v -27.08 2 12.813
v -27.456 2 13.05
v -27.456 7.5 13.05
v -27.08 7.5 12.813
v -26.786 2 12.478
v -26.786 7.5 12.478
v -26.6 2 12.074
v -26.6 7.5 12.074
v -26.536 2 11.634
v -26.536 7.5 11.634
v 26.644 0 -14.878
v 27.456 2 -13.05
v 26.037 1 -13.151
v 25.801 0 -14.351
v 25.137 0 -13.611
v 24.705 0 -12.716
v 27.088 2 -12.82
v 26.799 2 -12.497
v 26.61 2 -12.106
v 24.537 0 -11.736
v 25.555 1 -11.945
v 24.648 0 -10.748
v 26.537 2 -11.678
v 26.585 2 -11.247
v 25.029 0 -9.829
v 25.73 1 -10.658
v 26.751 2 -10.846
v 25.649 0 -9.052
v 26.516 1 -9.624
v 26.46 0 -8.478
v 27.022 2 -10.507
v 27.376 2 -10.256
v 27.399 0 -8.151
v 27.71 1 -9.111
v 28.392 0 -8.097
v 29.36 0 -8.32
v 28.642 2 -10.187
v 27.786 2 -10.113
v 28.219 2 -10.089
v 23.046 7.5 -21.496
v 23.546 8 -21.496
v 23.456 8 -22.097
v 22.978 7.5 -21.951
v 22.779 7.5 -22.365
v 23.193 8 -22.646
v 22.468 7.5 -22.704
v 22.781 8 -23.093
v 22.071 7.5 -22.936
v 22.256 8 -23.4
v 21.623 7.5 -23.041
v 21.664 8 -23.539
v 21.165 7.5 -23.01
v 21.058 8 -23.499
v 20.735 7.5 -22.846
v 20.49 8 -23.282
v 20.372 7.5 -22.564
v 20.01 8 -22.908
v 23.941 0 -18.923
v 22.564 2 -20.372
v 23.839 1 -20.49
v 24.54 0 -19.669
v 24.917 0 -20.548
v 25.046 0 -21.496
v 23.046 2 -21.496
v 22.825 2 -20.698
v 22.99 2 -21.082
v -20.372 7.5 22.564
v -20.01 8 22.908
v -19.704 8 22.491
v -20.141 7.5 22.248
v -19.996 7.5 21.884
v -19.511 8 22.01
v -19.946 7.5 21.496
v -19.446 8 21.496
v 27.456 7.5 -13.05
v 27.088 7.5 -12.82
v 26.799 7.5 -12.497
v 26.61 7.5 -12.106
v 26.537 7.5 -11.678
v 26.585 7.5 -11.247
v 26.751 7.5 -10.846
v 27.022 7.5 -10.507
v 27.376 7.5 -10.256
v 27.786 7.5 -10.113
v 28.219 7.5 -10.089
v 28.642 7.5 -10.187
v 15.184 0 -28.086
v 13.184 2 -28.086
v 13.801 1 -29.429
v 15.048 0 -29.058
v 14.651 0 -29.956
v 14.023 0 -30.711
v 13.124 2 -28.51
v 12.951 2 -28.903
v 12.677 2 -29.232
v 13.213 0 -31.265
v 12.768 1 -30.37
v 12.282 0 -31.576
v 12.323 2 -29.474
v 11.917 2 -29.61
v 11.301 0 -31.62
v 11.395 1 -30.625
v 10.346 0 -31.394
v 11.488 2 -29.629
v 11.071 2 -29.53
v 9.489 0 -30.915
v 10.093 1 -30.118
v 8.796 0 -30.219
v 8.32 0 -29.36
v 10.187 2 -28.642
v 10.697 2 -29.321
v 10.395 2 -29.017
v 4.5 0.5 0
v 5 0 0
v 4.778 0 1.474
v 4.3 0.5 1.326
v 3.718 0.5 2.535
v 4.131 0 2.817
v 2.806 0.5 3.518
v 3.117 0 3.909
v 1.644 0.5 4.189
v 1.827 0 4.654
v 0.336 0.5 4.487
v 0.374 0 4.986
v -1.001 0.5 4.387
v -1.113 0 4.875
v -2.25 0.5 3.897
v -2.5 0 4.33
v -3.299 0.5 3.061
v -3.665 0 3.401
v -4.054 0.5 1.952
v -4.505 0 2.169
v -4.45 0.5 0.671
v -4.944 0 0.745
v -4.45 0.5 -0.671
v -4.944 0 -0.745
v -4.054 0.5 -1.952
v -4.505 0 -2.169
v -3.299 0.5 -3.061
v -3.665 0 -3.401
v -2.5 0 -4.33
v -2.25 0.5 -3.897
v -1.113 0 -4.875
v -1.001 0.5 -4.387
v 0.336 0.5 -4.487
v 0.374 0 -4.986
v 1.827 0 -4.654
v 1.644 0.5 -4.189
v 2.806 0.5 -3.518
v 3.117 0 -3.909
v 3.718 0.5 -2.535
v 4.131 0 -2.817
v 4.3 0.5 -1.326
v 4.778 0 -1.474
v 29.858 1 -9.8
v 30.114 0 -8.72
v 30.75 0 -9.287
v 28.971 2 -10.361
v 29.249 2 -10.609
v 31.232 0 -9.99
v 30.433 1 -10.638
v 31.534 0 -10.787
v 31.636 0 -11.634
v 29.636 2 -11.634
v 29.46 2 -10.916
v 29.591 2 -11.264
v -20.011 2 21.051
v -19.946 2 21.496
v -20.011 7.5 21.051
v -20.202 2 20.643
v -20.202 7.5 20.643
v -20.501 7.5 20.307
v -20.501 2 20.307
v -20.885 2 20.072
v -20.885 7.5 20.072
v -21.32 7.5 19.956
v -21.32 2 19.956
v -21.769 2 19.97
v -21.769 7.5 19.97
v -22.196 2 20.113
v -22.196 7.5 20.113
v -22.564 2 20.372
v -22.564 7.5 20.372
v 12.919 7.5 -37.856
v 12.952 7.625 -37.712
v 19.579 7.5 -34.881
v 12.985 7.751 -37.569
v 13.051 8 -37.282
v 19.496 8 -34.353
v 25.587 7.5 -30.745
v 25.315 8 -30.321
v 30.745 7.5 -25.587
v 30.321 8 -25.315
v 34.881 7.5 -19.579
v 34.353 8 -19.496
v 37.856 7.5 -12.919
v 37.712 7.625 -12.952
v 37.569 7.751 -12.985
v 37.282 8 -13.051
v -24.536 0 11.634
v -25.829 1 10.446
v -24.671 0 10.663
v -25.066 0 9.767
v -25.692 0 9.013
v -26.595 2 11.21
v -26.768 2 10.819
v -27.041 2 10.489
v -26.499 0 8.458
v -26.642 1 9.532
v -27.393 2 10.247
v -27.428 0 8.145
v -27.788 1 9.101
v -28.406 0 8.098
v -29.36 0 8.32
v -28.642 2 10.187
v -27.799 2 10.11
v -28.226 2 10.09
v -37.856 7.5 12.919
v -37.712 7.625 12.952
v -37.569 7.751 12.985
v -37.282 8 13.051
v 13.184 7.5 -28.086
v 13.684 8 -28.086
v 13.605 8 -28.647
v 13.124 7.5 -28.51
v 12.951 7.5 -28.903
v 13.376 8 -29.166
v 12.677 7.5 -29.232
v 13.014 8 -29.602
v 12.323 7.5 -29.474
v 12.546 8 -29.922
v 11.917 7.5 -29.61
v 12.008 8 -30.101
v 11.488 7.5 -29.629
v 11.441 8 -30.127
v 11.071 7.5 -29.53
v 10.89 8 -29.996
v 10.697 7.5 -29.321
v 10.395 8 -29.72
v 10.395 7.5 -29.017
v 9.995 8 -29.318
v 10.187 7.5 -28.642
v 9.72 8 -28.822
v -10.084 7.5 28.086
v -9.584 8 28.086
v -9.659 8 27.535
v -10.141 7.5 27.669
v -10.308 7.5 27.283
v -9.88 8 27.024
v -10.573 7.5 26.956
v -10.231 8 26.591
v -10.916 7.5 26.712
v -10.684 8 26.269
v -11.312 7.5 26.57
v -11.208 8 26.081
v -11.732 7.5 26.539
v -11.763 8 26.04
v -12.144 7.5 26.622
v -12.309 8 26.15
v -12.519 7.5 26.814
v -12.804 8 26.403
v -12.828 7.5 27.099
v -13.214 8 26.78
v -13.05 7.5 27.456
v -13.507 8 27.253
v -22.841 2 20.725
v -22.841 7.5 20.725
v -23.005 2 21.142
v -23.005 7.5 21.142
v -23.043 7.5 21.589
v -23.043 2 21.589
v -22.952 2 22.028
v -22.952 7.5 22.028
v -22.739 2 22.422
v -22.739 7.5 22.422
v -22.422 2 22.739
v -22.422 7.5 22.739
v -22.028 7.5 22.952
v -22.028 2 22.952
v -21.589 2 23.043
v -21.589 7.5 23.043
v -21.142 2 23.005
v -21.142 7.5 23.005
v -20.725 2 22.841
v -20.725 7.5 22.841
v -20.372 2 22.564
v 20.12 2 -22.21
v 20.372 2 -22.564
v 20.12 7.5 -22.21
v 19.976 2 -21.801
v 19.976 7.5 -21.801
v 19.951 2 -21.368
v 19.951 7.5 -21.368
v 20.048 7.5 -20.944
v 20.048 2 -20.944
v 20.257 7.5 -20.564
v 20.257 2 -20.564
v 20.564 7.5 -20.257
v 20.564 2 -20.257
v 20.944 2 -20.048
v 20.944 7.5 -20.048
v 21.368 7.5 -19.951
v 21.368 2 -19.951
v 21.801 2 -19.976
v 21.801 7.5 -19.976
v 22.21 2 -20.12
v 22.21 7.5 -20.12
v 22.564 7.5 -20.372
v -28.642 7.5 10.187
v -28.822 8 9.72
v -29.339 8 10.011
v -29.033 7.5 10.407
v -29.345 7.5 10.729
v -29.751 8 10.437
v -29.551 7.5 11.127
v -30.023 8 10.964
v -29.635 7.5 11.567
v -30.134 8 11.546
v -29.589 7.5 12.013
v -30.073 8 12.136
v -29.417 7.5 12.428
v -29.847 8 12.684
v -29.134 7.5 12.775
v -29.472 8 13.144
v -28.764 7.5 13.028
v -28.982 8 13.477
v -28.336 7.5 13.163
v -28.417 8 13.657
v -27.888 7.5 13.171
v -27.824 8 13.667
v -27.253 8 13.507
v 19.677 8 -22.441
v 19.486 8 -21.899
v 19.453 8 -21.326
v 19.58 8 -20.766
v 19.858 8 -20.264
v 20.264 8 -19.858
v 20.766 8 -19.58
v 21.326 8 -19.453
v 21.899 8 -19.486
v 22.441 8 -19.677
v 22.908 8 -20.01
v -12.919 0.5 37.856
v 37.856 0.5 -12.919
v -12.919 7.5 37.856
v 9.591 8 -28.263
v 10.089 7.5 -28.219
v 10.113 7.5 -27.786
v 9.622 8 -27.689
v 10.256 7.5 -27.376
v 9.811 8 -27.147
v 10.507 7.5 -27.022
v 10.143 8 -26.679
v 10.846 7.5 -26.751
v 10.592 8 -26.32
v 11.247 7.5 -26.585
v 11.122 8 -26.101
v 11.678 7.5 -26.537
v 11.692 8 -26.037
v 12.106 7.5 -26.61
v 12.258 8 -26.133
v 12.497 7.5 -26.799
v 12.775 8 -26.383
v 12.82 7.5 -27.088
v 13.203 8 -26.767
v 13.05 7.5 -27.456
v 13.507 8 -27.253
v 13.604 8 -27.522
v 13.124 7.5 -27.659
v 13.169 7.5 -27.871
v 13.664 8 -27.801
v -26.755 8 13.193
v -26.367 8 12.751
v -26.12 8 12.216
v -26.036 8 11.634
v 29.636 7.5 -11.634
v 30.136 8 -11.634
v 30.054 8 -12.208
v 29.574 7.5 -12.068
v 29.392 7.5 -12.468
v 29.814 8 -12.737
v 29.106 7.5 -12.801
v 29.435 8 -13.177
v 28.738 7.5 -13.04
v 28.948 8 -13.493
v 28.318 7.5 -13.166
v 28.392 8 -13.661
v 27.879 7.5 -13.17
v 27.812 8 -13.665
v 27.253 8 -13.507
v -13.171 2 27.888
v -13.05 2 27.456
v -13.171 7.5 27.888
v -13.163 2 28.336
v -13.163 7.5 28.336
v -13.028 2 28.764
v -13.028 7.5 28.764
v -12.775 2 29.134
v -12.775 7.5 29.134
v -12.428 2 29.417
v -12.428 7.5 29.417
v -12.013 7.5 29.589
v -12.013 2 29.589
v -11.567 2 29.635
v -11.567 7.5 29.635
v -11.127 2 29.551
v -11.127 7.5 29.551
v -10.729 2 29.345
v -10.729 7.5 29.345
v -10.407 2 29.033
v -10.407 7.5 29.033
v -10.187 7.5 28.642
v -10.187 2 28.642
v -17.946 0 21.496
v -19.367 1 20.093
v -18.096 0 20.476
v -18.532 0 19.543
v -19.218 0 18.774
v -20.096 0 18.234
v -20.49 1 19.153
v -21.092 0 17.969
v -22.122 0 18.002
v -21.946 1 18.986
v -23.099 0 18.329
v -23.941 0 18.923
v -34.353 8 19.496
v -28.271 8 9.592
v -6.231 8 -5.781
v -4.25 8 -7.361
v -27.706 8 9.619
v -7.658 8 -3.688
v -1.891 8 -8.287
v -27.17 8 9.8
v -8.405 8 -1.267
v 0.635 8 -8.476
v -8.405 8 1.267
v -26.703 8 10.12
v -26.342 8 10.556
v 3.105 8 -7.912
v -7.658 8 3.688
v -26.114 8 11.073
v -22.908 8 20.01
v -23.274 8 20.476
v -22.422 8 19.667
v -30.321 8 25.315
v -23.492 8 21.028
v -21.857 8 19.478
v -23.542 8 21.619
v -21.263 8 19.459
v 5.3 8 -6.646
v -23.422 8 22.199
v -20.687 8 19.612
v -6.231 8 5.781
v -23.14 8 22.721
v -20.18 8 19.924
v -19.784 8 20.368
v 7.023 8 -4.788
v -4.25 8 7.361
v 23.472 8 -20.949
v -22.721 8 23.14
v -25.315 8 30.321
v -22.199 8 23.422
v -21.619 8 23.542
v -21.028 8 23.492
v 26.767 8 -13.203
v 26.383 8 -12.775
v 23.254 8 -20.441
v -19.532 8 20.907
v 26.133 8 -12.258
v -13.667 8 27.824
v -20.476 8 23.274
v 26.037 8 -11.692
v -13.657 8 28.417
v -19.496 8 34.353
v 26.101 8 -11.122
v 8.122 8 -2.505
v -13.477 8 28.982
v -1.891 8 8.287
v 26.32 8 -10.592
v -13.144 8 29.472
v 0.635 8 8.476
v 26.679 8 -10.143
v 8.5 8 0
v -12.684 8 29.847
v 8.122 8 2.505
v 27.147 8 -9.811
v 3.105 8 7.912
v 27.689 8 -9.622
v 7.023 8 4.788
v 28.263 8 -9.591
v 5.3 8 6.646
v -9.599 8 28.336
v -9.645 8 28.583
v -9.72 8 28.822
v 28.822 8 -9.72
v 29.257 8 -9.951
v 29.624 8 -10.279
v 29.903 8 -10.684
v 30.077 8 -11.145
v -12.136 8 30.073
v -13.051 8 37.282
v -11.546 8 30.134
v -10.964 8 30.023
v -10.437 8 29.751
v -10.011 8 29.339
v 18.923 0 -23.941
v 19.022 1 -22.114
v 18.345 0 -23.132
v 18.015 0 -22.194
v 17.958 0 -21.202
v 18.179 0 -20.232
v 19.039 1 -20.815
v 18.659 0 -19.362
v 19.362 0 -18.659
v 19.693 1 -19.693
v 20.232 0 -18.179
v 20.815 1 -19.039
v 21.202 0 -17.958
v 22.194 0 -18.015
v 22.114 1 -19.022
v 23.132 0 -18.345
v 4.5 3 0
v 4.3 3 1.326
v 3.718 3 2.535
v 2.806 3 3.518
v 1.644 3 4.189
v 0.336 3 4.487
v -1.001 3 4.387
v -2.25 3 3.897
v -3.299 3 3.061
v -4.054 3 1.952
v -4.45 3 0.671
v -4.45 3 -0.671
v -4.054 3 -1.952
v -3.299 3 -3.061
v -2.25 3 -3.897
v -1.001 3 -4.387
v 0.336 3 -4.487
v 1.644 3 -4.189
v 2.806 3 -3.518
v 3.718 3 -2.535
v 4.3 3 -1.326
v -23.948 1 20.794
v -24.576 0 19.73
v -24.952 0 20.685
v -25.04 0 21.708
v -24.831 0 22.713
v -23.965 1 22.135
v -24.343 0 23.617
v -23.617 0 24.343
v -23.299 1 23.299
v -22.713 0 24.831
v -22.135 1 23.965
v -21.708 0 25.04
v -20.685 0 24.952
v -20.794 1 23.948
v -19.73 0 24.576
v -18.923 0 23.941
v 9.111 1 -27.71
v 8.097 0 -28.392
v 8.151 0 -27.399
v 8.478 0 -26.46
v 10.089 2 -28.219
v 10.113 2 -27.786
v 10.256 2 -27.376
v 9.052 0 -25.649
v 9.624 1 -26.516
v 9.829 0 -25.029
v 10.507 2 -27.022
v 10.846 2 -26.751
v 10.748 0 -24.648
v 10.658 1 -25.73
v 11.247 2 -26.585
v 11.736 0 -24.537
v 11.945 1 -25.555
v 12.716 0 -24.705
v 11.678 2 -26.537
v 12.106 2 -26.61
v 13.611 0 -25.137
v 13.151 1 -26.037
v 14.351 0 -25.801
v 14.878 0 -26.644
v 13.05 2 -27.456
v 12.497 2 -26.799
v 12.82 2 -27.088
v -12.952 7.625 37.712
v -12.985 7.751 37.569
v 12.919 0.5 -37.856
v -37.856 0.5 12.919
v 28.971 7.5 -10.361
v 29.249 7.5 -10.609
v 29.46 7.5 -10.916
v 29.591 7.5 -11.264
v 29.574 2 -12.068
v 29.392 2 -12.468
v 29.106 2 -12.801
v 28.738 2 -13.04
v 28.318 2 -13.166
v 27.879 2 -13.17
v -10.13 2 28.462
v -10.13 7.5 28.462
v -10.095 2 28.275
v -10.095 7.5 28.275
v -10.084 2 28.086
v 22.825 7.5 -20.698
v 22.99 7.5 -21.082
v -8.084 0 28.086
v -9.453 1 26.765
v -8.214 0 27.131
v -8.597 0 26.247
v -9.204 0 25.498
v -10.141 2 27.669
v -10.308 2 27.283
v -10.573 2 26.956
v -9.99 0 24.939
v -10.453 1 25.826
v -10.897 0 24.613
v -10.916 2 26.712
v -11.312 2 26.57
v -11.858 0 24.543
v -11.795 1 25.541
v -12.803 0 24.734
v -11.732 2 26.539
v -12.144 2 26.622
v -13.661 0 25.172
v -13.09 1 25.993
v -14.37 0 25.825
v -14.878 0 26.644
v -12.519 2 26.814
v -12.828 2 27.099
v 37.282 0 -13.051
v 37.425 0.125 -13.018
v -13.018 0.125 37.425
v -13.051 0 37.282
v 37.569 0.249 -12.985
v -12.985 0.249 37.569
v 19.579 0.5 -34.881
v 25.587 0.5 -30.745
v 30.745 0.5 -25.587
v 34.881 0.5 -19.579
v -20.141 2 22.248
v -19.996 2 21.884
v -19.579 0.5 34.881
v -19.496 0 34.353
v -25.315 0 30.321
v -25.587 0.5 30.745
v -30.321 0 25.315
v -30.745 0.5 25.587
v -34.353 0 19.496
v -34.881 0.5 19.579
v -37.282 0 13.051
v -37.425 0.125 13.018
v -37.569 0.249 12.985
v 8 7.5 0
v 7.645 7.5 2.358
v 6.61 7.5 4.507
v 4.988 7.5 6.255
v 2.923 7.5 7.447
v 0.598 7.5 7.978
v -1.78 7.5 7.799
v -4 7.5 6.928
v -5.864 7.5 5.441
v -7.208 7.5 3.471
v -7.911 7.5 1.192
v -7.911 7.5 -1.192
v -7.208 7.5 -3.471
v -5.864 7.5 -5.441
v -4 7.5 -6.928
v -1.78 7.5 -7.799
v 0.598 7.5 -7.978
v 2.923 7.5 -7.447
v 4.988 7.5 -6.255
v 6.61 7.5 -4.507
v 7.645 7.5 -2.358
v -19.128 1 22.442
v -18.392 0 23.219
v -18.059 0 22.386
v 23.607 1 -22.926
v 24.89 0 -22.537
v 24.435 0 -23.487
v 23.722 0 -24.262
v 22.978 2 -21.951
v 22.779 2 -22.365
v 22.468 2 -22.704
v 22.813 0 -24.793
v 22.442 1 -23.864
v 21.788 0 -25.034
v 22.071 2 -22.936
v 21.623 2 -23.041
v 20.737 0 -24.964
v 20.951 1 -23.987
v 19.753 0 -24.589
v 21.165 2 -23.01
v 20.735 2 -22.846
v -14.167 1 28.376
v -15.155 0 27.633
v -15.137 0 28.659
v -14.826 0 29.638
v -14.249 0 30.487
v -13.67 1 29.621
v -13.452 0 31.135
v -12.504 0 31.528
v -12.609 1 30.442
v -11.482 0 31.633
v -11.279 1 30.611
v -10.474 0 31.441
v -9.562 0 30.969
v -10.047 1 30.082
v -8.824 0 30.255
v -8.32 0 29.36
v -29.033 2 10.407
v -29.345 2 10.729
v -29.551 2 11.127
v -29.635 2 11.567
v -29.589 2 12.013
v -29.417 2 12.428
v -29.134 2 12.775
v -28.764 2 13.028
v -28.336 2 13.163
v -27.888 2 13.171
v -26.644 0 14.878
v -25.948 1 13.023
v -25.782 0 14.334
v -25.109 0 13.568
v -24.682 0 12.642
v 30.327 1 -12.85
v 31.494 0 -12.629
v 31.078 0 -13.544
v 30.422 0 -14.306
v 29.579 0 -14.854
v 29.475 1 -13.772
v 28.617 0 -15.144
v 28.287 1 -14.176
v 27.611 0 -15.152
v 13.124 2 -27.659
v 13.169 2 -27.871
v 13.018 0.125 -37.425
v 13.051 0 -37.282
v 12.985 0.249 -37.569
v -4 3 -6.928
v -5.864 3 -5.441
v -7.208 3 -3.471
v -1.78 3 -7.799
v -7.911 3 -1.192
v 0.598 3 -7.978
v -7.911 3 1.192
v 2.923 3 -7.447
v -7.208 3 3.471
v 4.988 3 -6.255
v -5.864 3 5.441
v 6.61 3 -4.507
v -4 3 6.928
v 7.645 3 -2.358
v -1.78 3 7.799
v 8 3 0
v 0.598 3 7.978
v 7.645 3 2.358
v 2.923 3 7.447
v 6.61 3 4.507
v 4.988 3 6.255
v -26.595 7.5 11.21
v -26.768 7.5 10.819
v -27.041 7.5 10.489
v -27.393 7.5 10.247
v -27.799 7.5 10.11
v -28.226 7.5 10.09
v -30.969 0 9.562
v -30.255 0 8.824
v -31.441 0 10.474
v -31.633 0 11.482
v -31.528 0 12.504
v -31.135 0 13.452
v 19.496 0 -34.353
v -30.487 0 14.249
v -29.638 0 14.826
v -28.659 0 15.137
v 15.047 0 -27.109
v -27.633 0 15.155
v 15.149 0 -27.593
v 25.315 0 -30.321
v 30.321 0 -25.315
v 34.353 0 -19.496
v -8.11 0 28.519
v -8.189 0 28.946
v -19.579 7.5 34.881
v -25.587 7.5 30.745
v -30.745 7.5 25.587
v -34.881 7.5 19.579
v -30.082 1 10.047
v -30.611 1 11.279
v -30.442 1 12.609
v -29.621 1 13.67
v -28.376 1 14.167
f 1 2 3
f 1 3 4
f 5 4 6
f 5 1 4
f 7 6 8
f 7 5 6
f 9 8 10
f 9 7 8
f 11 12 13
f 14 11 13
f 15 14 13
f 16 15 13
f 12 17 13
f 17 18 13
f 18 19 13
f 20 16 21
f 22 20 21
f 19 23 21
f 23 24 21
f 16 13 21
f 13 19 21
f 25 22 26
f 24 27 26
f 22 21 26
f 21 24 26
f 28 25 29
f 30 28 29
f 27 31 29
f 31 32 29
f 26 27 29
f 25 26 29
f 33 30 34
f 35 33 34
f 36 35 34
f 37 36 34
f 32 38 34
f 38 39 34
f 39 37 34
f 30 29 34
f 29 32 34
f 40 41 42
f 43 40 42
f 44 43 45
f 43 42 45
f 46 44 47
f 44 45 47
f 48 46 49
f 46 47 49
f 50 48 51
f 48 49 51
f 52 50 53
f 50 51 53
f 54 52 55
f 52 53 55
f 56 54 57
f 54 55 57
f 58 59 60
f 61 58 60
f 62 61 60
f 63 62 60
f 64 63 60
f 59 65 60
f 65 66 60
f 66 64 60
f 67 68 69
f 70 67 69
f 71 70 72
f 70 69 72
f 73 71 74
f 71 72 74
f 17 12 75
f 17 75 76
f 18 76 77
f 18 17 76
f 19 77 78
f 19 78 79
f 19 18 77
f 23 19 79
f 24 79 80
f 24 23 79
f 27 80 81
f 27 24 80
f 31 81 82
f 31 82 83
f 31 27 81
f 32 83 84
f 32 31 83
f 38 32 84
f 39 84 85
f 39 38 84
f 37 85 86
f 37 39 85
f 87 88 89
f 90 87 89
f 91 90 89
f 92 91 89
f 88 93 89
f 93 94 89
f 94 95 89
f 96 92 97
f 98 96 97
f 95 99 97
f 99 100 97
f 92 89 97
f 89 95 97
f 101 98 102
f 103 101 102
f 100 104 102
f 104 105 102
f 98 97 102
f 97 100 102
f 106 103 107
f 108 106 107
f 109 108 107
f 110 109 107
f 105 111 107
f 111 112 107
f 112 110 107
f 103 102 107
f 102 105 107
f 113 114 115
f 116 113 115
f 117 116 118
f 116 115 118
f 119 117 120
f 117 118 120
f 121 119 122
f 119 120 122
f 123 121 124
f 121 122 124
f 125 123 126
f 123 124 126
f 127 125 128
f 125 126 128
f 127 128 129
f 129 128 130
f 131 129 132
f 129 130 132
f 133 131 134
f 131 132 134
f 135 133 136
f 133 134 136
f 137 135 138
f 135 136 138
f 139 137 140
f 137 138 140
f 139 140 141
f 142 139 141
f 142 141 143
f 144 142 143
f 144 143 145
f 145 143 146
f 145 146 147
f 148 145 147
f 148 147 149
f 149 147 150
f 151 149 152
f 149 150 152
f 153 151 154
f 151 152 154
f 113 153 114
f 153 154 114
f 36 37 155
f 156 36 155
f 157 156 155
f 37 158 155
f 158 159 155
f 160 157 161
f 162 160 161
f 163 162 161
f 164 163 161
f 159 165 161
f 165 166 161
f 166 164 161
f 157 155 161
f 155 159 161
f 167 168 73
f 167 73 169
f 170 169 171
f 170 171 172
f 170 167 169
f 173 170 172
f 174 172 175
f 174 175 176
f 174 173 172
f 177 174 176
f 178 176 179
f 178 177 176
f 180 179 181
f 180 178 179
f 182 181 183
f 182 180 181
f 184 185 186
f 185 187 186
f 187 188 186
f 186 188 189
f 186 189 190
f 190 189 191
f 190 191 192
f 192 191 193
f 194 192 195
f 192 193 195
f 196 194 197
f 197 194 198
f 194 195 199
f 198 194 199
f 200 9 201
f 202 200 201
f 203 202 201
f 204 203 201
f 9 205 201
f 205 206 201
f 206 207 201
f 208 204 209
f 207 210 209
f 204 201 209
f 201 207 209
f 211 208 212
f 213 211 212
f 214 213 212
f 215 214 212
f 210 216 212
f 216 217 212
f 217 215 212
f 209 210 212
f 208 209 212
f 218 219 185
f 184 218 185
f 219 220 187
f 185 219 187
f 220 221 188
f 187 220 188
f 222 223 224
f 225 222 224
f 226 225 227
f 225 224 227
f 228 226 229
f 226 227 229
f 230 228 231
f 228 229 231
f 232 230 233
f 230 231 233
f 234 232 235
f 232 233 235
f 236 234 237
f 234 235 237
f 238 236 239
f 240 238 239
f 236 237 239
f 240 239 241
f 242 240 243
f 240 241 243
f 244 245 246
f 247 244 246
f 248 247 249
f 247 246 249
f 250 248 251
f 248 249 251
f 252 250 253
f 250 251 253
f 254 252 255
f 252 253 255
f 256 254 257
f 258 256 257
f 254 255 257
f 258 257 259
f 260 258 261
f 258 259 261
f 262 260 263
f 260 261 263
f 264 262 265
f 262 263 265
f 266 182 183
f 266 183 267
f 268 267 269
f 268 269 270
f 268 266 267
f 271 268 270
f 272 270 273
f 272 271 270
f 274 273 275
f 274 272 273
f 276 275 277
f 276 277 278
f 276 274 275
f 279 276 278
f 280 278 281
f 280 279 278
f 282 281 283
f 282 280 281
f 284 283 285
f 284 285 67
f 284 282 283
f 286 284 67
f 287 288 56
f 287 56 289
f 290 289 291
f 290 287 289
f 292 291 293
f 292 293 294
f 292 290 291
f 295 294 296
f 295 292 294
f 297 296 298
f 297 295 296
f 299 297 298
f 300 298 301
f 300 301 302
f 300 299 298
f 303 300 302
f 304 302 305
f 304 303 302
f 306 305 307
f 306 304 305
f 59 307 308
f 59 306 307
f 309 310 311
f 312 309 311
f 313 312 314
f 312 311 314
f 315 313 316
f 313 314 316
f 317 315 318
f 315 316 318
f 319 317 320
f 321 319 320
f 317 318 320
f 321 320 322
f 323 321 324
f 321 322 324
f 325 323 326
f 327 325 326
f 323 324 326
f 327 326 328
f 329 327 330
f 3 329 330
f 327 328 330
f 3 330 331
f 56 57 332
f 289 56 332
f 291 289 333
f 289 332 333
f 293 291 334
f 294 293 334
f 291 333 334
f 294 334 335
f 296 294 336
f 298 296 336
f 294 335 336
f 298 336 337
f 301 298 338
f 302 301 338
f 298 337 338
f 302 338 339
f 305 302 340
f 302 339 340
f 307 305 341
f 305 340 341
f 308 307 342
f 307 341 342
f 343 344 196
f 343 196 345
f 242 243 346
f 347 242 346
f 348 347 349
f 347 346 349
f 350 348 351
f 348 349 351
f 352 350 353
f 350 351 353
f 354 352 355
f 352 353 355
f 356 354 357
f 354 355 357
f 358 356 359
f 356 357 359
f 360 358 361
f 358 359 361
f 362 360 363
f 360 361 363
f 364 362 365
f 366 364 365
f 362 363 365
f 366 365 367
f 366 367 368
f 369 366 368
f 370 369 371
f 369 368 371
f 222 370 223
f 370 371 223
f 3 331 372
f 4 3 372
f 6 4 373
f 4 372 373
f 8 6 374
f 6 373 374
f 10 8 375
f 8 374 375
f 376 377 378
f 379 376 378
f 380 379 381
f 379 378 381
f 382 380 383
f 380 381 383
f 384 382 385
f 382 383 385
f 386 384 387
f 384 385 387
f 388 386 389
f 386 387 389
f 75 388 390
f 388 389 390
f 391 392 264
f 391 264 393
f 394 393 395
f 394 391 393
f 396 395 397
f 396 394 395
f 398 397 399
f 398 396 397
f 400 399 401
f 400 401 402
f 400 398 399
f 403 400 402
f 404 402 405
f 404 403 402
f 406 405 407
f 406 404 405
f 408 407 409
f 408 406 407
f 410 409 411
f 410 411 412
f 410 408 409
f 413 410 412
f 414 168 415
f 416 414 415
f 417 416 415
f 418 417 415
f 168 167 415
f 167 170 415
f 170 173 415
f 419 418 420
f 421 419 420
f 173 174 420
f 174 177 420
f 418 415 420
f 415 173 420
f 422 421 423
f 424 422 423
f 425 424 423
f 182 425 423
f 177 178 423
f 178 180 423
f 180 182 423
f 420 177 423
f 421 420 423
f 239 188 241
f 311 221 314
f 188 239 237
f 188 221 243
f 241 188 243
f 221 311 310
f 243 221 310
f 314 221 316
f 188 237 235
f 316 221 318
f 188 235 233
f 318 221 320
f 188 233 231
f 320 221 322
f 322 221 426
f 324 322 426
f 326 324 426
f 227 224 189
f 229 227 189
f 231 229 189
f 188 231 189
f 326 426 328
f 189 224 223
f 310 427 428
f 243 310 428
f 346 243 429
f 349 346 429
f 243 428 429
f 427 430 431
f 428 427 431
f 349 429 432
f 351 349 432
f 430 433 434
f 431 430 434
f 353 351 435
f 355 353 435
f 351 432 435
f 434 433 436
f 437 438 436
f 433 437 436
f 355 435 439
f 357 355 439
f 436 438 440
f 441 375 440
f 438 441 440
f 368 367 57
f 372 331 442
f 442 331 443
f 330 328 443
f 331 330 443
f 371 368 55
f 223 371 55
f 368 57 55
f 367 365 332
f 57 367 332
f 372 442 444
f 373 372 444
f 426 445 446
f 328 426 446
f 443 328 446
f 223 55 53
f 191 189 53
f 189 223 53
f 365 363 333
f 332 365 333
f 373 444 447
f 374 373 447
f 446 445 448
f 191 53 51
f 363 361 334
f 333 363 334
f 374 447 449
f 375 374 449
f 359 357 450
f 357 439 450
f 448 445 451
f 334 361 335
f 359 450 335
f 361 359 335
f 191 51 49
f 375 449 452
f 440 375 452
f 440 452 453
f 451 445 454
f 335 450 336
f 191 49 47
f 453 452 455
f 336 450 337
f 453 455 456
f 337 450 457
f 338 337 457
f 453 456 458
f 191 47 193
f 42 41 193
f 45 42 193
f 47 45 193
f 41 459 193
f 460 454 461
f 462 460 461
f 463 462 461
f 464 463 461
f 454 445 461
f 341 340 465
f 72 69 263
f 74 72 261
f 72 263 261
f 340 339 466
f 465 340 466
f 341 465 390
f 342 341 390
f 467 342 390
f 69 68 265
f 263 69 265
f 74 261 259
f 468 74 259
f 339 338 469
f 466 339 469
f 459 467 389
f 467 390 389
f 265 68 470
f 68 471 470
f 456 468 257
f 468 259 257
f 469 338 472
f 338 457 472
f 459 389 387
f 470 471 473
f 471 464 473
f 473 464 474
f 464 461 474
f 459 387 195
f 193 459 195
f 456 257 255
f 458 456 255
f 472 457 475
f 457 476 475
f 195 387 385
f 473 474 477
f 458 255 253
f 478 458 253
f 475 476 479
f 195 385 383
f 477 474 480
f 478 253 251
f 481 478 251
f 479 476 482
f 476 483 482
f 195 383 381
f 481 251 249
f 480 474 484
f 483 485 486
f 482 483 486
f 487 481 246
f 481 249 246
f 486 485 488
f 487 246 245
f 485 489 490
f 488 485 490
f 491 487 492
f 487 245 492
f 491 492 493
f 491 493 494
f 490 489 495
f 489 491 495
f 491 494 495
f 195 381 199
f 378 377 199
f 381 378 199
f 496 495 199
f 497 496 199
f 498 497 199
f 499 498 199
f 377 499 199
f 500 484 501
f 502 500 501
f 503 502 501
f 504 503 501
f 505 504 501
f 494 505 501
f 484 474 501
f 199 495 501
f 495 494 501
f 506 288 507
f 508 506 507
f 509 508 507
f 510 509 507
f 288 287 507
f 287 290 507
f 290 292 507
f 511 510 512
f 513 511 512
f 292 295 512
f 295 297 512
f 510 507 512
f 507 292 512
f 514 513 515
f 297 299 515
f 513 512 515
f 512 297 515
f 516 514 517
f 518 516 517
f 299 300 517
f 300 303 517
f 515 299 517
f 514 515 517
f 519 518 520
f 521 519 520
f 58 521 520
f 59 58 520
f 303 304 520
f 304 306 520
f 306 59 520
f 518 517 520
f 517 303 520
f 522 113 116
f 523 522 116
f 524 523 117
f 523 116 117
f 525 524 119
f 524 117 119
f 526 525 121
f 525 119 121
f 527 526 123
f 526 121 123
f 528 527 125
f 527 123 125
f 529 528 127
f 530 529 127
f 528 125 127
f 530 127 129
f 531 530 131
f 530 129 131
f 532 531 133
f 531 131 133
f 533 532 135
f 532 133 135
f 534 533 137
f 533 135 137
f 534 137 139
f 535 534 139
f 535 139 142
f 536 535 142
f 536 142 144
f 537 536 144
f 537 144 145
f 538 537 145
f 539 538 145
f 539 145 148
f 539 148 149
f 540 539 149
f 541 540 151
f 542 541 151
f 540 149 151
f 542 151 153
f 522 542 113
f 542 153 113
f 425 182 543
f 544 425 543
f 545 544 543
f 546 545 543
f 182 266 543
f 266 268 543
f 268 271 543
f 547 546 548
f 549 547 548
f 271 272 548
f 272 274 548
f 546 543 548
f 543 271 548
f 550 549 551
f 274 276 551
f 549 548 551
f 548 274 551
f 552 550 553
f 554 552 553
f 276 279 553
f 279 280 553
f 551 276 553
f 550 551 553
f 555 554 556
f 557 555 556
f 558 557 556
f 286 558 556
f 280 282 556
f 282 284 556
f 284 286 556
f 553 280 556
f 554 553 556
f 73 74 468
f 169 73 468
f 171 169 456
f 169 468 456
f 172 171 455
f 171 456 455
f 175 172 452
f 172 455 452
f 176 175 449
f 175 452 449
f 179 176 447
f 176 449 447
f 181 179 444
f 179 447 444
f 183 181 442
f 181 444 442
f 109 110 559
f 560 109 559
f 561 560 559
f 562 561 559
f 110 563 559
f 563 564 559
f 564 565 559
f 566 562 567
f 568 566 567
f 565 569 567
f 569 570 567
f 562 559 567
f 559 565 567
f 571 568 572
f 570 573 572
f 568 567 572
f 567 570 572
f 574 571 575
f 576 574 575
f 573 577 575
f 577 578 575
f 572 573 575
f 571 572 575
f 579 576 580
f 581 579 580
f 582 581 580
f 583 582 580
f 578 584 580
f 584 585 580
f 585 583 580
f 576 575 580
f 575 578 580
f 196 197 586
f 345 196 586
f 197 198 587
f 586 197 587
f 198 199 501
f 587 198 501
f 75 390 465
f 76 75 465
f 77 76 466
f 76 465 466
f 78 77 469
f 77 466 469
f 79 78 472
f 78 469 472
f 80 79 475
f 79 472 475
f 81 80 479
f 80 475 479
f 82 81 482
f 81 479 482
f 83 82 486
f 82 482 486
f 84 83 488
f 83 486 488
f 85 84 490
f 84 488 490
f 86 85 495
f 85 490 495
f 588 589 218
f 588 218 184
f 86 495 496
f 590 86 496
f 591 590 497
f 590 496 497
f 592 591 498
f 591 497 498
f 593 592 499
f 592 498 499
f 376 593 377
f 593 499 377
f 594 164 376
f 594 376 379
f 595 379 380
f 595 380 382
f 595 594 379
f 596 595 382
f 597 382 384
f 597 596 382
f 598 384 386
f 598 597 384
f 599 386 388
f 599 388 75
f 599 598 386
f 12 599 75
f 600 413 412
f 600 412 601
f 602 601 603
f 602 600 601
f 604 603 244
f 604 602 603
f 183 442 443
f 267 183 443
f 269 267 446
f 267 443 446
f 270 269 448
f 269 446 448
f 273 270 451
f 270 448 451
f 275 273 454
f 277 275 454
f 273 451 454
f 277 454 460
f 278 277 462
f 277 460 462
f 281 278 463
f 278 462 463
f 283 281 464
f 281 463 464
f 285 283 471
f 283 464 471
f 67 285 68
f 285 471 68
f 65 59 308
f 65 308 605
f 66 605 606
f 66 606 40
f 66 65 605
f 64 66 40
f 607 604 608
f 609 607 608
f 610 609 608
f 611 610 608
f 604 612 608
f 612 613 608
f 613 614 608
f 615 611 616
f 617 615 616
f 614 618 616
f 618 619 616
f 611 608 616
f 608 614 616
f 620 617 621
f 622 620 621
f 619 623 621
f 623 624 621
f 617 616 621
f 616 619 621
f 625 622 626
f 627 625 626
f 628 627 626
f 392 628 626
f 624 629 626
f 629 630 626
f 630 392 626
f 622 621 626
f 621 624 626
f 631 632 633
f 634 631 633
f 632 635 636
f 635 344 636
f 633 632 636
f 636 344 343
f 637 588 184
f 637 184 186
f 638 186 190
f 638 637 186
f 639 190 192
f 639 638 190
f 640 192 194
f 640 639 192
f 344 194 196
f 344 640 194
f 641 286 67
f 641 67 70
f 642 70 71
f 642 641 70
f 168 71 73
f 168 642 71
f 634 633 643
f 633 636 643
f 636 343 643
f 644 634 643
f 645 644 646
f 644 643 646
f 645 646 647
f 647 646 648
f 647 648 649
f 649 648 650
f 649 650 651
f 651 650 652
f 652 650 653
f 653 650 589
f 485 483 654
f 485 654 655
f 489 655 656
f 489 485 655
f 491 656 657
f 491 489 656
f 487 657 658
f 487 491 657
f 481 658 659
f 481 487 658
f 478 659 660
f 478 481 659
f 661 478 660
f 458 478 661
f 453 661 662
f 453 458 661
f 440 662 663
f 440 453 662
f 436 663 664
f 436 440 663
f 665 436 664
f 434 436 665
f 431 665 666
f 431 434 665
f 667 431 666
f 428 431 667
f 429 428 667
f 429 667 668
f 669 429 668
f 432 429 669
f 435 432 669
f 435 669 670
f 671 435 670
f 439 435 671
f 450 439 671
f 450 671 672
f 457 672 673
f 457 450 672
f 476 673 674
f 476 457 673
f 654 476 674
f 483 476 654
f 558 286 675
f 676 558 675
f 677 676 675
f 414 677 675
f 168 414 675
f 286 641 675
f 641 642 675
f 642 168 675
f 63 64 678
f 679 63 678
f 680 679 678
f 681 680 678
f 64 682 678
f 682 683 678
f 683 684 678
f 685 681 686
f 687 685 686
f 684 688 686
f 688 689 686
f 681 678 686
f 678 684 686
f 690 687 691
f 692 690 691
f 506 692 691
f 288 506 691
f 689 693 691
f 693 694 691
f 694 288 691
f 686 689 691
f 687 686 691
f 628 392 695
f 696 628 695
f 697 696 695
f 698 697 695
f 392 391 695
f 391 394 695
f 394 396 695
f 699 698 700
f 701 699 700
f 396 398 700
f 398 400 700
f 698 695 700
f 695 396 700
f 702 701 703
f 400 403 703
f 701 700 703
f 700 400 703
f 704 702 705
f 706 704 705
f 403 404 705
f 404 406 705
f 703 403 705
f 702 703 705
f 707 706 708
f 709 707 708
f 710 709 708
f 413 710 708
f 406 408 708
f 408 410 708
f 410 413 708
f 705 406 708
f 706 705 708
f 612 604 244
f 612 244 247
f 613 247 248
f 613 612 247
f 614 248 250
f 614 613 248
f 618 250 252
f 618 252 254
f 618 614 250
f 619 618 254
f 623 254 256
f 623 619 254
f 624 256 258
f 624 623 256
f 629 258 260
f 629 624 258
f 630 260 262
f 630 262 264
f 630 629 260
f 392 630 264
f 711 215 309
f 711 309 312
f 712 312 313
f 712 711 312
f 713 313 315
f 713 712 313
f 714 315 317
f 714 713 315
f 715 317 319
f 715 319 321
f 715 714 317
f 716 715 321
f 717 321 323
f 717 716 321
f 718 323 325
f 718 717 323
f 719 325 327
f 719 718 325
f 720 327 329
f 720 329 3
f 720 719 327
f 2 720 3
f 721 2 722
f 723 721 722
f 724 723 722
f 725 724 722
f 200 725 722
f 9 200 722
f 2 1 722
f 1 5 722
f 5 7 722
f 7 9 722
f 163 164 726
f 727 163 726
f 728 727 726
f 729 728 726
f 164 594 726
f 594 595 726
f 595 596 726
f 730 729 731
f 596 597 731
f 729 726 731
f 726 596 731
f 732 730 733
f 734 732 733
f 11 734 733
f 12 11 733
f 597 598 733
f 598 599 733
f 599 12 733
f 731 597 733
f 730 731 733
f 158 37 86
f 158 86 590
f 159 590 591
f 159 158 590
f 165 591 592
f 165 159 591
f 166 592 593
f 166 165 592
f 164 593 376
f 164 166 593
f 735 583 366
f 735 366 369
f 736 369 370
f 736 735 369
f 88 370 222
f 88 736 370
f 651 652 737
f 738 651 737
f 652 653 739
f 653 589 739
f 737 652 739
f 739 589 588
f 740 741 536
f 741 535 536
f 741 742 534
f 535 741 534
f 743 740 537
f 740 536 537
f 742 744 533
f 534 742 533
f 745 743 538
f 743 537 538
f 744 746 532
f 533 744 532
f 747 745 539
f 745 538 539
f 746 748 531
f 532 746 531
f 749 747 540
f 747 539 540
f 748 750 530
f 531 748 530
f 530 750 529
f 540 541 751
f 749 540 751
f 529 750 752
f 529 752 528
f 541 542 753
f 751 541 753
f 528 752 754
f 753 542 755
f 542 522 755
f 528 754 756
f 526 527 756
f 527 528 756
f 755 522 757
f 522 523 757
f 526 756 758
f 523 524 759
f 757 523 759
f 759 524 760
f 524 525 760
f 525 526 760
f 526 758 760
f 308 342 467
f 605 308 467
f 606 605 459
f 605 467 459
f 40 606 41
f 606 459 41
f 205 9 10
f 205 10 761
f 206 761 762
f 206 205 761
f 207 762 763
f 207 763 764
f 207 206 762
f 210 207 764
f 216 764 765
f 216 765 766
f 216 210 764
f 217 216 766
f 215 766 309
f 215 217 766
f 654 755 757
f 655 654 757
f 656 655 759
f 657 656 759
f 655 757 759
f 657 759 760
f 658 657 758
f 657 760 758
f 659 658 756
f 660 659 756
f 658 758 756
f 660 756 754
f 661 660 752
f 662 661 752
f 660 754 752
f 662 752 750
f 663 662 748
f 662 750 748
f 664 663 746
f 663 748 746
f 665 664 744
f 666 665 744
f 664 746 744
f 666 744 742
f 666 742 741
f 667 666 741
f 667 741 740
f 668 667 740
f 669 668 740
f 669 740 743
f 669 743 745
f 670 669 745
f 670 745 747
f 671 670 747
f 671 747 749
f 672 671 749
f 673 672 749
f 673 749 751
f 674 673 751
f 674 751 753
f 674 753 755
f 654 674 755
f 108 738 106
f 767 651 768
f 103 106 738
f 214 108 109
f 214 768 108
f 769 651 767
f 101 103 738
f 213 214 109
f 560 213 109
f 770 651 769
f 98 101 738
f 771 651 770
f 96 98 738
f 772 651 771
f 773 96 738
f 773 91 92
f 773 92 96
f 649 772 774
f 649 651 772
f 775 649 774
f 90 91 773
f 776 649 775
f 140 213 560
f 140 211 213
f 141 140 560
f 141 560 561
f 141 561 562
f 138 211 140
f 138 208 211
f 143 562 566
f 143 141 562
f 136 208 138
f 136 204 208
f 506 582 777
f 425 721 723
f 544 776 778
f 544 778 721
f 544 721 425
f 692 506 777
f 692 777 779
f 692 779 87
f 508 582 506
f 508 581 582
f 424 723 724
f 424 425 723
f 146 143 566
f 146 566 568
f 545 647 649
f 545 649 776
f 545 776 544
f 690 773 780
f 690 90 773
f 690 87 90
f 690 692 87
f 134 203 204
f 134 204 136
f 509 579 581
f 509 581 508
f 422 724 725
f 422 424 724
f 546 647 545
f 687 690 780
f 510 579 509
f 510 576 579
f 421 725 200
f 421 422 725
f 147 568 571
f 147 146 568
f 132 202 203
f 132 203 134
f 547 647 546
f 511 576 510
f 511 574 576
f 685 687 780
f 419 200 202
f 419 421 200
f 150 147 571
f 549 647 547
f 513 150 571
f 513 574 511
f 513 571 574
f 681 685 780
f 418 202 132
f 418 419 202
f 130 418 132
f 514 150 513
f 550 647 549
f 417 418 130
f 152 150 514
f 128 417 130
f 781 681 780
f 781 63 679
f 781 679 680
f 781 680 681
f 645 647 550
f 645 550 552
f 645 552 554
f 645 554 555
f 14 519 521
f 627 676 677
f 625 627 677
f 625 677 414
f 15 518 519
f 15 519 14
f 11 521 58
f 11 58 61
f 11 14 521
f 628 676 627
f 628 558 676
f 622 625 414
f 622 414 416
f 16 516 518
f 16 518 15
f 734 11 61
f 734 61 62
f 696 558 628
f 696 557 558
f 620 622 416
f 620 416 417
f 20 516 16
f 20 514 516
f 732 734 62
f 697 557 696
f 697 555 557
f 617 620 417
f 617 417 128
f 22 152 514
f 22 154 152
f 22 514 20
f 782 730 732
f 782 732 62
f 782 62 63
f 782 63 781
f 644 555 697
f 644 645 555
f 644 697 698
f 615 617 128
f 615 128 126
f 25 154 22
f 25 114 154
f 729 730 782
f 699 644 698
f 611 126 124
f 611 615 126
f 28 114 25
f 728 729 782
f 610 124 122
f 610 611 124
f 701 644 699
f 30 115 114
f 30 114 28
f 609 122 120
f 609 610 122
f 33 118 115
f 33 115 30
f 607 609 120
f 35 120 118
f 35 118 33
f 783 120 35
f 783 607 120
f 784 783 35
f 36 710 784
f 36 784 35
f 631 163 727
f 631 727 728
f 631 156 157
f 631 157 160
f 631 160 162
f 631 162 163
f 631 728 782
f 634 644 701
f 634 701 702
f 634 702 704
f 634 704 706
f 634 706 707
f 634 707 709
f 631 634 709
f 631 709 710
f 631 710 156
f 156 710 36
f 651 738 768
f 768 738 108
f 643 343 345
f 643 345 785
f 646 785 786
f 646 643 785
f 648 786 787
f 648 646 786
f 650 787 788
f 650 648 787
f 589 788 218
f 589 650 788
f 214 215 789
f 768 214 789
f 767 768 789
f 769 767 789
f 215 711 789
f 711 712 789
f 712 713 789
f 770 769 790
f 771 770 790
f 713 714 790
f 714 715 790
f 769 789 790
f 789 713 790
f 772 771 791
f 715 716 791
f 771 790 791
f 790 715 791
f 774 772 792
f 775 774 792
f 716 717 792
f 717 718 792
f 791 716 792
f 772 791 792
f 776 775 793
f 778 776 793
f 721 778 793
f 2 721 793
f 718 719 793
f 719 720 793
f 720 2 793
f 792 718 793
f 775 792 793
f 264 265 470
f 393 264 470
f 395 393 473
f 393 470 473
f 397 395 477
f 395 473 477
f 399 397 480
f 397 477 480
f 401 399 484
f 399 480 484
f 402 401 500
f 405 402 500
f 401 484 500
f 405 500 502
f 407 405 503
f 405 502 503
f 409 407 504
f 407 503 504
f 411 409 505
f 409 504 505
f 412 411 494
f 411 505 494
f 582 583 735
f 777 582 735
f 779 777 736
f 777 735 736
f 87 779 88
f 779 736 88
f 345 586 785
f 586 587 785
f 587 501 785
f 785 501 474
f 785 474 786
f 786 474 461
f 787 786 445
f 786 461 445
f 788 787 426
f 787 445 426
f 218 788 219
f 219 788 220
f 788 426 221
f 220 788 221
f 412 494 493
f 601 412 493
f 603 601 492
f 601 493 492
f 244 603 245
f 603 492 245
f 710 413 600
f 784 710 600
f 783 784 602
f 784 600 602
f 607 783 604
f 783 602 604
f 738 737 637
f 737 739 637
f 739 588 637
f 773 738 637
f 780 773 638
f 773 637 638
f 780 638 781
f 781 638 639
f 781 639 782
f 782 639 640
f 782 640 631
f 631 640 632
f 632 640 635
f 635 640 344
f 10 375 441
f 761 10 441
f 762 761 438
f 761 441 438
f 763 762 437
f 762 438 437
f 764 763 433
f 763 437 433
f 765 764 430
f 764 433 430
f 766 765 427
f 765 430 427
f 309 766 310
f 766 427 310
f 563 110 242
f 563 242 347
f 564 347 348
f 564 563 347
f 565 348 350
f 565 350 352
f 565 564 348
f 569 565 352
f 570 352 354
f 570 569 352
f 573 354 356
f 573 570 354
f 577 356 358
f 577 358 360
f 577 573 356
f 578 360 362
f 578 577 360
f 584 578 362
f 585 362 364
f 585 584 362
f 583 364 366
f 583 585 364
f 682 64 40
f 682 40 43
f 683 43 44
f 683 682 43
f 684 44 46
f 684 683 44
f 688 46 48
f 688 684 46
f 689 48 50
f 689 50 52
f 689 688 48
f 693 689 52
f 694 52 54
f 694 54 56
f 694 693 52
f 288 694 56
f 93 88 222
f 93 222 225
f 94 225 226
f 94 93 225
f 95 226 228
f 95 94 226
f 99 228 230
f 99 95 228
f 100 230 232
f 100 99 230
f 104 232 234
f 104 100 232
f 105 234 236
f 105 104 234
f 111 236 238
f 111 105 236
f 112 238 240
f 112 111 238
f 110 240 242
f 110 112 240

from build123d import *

# Parameters (mm, degrees)
F0_R     = 8
F1_DEPTH = 8
F0_R_2   = 4.5
F2_DEPTH = 3
F3_SIZE  = 0.5
F4_SIZE  = 2


with BuildPart() as f1:
    # F0 (on Front) → F1 (new body)
    with BuildSketch(Plane.XZ):
        with BuildLine():
            Line((-7.7551369733, 32.692779792), (-12.9187443003, 37.856387119))
            ThreePointArc((-12.9187443003, 37.856387119), (-28.2842712475, 28.2842712475), (-37.856387119, 12.9187443003))
            Line((-37.856387119, 12.9187443003), (-32.692779792, 7.7551369733))
            ThreePointArc((-32.692779792, 7.7551369733), (-23.7587878479, 23.7587878479), (-7.7551369733, 32.692779792))
        make_face()
        with BuildLine():
            Line((-5.0414182424, 29.9790610611), (-7.7551369733, 32.692779792))
            ThreePointArc((-7.7551369733, 32.692779792), (-23.7587878479, 23.7587878479), (-32.692779792, 7.7551369733))
            Line((-32.692779792, 7.7551369733), (-29.9790610611, 5.0414182424))
            ThreePointArc((-29.9790610611, 5.0414182424), (-29.423423687, 7.6434376124), (-28.6423974084, 10.1869068269))
            ThreePointArc((-28.6423974084, 10.1869068269), (-29.5179510637, 12.2267356641), (-27.4564643335, 13.0500025402))
            ThreePointArc((-27.4564643335, 13.0500025402), (-25.276676214, 16.8893350838), (-22.5637642579, 20.3724456684))
            ThreePointArc((-22.5637642579, 20.3724456684), (-22.5920616589, 22.5920616589), (-20.3724456684, 22.5637642579))
            ThreePointArc((-20.3724456684, 22.5637642579), (-16.8893350838, 25.276676214), (-13.0500025402, 27.4564643335))
            ThreePointArc((-13.0500025402, 27.4564643335), (-12.2267356641, 29.5179510637), (-10.1869068269, 28.6423974084))
            ThreePointArc((-10.1869068269, 28.6423974084), (-7.6434376124, 29.423423687), (-5.0414182424, 29.9790610611))
        make_face()
        with BuildLine():
            Line((-0.0622796062, 24.9999224249), (-5.0414182424, 29.9790610611))
            ThreePointArc((-5.0414182424, 29.9790610611), (-7.6434376124, 29.423423687), (-10.1869068269, 28.6423974084))
            ThreePointArc((-10.1869068269, 28.6423974084), (-10.1096278948, 28.3689238734), (-10.0835763439, 28.0859377883))
            ThreePointArc((-10.0835763439, 28.0859377883), (-11.3118315726, 26.5696989212), (-13.0500025402, 27.4564643335))
            ThreePointArc((-13.0500025402, 27.4564643335), (-16.8893350838, 25.276676214), (-20.3724456684, 22.5637642579))
            ThreePointArc((-20.3724456684, 22.5637642579), (-20.0565877875, 22.0709023286), (-19.9460461481, 21.4960461481))
            ThreePointArc((-19.9460461481, 21.4960461481), (-20.8846800835, 20.0717106767), (-22.5637642579, 20.3724456684))
            ThreePointArc((-22.5637642579, 20.3724456684), (-25.276676214, 16.8893350838), (-27.4564643335, 13.0500025402))
            ThreePointArc((-27.4564643335, 13.0500025402), (-26.7862870939, 12.4782112192), (-26.5359377883, 11.6335763439))
            ThreePointArc((-26.5359377883, 11.6335763439), (-27.2084448855, 10.3558806816), (-28.6423974084, 10.1869068269))
            ThreePointArc((-28.6423974084, 10.1869068269), (-29.423423687, 7.6434376124), (-29.9790610611, 5.0414182424))
            Line((-29.9790610611, 5.0414182424), (-24.9999224249, 0.0622796062))
            ThreePointArc((-24.9999224249, 0.0622796062), (-17.6776695297, 17.6776695297), (-0.0622796062, 24.9999224249))
        make_face()
        with BuildLine():
            Line((24.9999224249, -0.0622796062), (-0.0622796062, 24.9999224249))
            ThreePointArc((-0.0622796062, 24.9999224249), (-17.6776695297, 17.6776695297), (-24.9999224249, 0.0622796062))
            Line((-24.9999224249, 0.0622796062), (0.0622796062, -24.9999224249))
            ThreePointArc((0.0622796062, -24.9999224249), (17.6776695297, -17.6776695297), (24.9999224249, -0.0622796062))
        make_face()
        Circle(F0_R, mode=Mode.SUBTRACT)
        with BuildLine():
            ThreePointArc((28.6423974084, -10.1869068269), (29.423423687, -7.6434376124), (29.9790610611, -5.0414182424))
            Line((29.9790610611, -5.0414182424), (24.9999224249, -0.0622796062))
            ThreePointArc((24.9999224249, -0.0622796062), (17.6776695297, -17.6776695297), (0.0622796062, -24.9999224249))
            Line((0.0622796062, -24.9999224249), (5.0414182424, -29.9790610611))
            ThreePointArc((5.0414182424, -29.9790610611), (7.6434376124, -29.423423687), (10.1869068269, -28.6423974084))
            ThreePointArc((10.1869068269, -28.6423974084), (11.0404170237, -26.653924513), (13.0500025402, -27.4564643335))
            ThreePointArc((13.0500025402, -27.4564643335), (16.8893350838, -25.276676214), (20.3724456684, -22.5637642579))
            ThreePointArc((20.3724456684, -22.5637642579), (20.4000306372, -20.4000306372), (22.5637642579, -20.3724456684))
            ThreePointArc((22.5637642579, -20.3724456684), (25.276676214, -16.8893350838), (27.4564643335, -13.0500025402))
            ThreePointArc((27.4564643335, -13.0500025402), (26.653924513, -11.0404170237), (28.6423974084, -10.1869068269))
        make_face()
        with BuildLine():
            ThreePointArc((7.7551369733, -32.692779792), (23.7587878479, -23.7587878479), (32.692779792, -7.7551369733))
            Line((32.692779792, -7.7551369733), (29.9790610611, -5.0414182424))
            ThreePointArc((29.9790610611, -5.0414182424), (29.423423687, -7.6434376124), (28.6423974084, -10.1869068269))
            ThreePointArc((28.6423974084, -10.1869068269), (29.3636334507, -10.7560834411), (29.6359377883, -11.6335763439))
            ThreePointArc((29.6359377883, -11.6335763439), (28.9305726636, -12.9332270383), (27.4564643335, -13.0500025402))
            ThreePointArc((27.4564643335, -13.0500025402), (25.276676214, -16.8893350838), (22.5637642579, -20.3724456684))
            ThreePointArc((22.5637642579, -20.3724456684), (22.9203816195, -20.8846800835), (23.0460461481, -21.4960461481))
            ThreePointArc((23.0460461481, -21.4960461481), (22.0709023286, -22.9355045086), (20.3724456684, -22.5637642579))
            ThreePointArc((20.3724456684, -22.5637642579), (16.8893350838, -25.276676214), (13.0500025402, -27.4564643335))
            ThreePointArc((13.0500025402, -27.4564643335), (13.149815211, -27.7641930171), (13.1835763439, -28.0859377883))
            ThreePointArc((13.1835763439, -28.0859377883), (11.916562429, -29.6098862375), (10.1869068269, -28.6423974084))
            ThreePointArc((10.1869068269, -28.6423974084), (7.6434376124, -29.423423687), (5.0414182424, -29.9790610611))
            Line((5.0414182424, -29.9790610611), (7.7551369733, -32.692779792))
        make_face()
        with BuildLine():
            ThreePointArc((12.9187443003, -37.856387119), (28.2842712475, -28.2842712475), (37.856387119, -12.9187443003))
            Line((37.856387119, -12.9187443003), (32.692779792, -7.7551369733))
            ThreePointArc((32.692779792, -7.7551369733), (23.7587878479, -23.7587878479), (7.7551369733, -32.692779792))
            Line((7.7551369733, -32.692779792), (12.9187443003, -37.856387119))
        make_face()
    extrude(amount=-F1_DEPTH)

    # F0 (on Front) → F2 (join)
    with BuildSketch(Plane.XZ):
        Circle(F0_R)
        Circle(F0_R_2, mode=Mode.SUBTRACT)
    extrude(amount=-F2_DEPTH)

    # F3
    f3_edges = [f1.edges().sort_by_distance(p)[0] for p in [
        (-28.284271, 8, 28.284271),
        (-12.468821, 8, -12.468821),
        (28.284271, 8, -28.284271),
        (12.468821, 8, 12.468821),
        (10.21715, 8, -28.715411),
        (20.428328, 8, -22.619647),
        (27.529478, 8, -13.080246),
        (-28.715411, 8, 10.21715),
        (-22.619647, 8, 20.428328),
        (-13.080246, 8, 27.529478),
        (-8, 8, 0),
        (-4.5, 0, 0),
        (12.468821, 0, 12.468821),
        (-28.284271, 0, 28.284271),
        (-12.468821, 0, -12.468821),
        (28.284271, 0, -28.284271),
    ]]
    chamfer(f3_edges, length=F3_SIZE)

    # F4
    f4_edges = [f1.edges().sort_by_distance(p)[0] for p in [
        (-28.715411, 0, 10.21715),
        (-22.619647, 0, 20.428328),
        (-13.080246, 0, 27.529478),
        (27.529478, 0, -13.080246),
        (20.428328, 0, -22.619647),
        (10.21715, 0, -28.715411),
    ]]
    chamfer(f4_edges, length=F4_SIZE)


solid = f1.part
